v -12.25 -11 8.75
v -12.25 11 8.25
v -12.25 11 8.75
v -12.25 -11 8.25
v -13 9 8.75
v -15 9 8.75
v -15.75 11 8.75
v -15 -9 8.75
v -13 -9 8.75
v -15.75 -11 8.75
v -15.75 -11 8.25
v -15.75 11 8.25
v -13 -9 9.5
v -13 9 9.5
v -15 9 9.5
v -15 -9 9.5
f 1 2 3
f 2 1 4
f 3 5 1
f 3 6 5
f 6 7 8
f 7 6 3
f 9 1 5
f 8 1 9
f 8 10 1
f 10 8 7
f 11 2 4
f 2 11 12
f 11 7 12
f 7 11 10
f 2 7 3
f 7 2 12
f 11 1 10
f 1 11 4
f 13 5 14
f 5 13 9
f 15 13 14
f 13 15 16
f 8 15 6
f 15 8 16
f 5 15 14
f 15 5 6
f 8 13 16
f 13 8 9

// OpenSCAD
color("red") translate([-14,0,8.5]) cube(size=[3.5, 22, 0.5], center=true);
color("red") translate([-14,0,9]) cube(size=[2, 18, 1], center=true);
